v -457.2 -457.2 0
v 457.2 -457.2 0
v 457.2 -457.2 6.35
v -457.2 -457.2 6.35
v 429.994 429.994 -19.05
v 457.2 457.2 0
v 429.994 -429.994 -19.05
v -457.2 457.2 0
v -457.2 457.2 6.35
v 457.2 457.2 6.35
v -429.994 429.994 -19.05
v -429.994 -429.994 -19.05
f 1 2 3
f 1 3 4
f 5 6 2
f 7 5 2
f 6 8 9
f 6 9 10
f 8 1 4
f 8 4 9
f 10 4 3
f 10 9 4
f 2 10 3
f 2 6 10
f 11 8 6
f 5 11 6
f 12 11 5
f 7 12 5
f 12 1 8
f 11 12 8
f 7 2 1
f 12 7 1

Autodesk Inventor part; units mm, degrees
ref_plane "YZ Plane" through (0, 0, 0) normal (1, 0, 0) x (0, 1, 0)
ref_plane "XZ Plane" through (0, 0, 0) normal (0, 1, 0) x (-1, 0, 0)
ref_plane "XY Plane" through (0, 0, 0) normal (0, 0, 1) x (1, 0, 0)
sketch "Sketch1" plane through (0, 0, 0) normal (0, 0, 1) x (1, 0, 0)
  line L0 (457.2, -457.2) -> (-457.2, -457.2)
  line L1 (-457.2, -457.2) -> (-457.2, 457.2)
  line L2 (-457.2, 457.2) -> (457.2, 457.2)
  line L3 (457.2, 457.2) -> (457.2, -457.2)
  point P0 (0, 0)
  dimension "d0" = 914.4
  dimension "d1" = 914.4
  dimension "d2" = 457.2
  dimension "d3" = 457.2
extrude "Extrusion1" add sketch "Sketch1" against normal blind 19.05 draft -55
extrude "Extrusion2" add sketch "Sketch1" along normal blind 6.35
equation "\"d1\" = d0"
equation "\"d2\" = 0.5 * d0"
equation "\"d3\" = d2"
properties part number "TableTop" material "Wood (Walnut)"
